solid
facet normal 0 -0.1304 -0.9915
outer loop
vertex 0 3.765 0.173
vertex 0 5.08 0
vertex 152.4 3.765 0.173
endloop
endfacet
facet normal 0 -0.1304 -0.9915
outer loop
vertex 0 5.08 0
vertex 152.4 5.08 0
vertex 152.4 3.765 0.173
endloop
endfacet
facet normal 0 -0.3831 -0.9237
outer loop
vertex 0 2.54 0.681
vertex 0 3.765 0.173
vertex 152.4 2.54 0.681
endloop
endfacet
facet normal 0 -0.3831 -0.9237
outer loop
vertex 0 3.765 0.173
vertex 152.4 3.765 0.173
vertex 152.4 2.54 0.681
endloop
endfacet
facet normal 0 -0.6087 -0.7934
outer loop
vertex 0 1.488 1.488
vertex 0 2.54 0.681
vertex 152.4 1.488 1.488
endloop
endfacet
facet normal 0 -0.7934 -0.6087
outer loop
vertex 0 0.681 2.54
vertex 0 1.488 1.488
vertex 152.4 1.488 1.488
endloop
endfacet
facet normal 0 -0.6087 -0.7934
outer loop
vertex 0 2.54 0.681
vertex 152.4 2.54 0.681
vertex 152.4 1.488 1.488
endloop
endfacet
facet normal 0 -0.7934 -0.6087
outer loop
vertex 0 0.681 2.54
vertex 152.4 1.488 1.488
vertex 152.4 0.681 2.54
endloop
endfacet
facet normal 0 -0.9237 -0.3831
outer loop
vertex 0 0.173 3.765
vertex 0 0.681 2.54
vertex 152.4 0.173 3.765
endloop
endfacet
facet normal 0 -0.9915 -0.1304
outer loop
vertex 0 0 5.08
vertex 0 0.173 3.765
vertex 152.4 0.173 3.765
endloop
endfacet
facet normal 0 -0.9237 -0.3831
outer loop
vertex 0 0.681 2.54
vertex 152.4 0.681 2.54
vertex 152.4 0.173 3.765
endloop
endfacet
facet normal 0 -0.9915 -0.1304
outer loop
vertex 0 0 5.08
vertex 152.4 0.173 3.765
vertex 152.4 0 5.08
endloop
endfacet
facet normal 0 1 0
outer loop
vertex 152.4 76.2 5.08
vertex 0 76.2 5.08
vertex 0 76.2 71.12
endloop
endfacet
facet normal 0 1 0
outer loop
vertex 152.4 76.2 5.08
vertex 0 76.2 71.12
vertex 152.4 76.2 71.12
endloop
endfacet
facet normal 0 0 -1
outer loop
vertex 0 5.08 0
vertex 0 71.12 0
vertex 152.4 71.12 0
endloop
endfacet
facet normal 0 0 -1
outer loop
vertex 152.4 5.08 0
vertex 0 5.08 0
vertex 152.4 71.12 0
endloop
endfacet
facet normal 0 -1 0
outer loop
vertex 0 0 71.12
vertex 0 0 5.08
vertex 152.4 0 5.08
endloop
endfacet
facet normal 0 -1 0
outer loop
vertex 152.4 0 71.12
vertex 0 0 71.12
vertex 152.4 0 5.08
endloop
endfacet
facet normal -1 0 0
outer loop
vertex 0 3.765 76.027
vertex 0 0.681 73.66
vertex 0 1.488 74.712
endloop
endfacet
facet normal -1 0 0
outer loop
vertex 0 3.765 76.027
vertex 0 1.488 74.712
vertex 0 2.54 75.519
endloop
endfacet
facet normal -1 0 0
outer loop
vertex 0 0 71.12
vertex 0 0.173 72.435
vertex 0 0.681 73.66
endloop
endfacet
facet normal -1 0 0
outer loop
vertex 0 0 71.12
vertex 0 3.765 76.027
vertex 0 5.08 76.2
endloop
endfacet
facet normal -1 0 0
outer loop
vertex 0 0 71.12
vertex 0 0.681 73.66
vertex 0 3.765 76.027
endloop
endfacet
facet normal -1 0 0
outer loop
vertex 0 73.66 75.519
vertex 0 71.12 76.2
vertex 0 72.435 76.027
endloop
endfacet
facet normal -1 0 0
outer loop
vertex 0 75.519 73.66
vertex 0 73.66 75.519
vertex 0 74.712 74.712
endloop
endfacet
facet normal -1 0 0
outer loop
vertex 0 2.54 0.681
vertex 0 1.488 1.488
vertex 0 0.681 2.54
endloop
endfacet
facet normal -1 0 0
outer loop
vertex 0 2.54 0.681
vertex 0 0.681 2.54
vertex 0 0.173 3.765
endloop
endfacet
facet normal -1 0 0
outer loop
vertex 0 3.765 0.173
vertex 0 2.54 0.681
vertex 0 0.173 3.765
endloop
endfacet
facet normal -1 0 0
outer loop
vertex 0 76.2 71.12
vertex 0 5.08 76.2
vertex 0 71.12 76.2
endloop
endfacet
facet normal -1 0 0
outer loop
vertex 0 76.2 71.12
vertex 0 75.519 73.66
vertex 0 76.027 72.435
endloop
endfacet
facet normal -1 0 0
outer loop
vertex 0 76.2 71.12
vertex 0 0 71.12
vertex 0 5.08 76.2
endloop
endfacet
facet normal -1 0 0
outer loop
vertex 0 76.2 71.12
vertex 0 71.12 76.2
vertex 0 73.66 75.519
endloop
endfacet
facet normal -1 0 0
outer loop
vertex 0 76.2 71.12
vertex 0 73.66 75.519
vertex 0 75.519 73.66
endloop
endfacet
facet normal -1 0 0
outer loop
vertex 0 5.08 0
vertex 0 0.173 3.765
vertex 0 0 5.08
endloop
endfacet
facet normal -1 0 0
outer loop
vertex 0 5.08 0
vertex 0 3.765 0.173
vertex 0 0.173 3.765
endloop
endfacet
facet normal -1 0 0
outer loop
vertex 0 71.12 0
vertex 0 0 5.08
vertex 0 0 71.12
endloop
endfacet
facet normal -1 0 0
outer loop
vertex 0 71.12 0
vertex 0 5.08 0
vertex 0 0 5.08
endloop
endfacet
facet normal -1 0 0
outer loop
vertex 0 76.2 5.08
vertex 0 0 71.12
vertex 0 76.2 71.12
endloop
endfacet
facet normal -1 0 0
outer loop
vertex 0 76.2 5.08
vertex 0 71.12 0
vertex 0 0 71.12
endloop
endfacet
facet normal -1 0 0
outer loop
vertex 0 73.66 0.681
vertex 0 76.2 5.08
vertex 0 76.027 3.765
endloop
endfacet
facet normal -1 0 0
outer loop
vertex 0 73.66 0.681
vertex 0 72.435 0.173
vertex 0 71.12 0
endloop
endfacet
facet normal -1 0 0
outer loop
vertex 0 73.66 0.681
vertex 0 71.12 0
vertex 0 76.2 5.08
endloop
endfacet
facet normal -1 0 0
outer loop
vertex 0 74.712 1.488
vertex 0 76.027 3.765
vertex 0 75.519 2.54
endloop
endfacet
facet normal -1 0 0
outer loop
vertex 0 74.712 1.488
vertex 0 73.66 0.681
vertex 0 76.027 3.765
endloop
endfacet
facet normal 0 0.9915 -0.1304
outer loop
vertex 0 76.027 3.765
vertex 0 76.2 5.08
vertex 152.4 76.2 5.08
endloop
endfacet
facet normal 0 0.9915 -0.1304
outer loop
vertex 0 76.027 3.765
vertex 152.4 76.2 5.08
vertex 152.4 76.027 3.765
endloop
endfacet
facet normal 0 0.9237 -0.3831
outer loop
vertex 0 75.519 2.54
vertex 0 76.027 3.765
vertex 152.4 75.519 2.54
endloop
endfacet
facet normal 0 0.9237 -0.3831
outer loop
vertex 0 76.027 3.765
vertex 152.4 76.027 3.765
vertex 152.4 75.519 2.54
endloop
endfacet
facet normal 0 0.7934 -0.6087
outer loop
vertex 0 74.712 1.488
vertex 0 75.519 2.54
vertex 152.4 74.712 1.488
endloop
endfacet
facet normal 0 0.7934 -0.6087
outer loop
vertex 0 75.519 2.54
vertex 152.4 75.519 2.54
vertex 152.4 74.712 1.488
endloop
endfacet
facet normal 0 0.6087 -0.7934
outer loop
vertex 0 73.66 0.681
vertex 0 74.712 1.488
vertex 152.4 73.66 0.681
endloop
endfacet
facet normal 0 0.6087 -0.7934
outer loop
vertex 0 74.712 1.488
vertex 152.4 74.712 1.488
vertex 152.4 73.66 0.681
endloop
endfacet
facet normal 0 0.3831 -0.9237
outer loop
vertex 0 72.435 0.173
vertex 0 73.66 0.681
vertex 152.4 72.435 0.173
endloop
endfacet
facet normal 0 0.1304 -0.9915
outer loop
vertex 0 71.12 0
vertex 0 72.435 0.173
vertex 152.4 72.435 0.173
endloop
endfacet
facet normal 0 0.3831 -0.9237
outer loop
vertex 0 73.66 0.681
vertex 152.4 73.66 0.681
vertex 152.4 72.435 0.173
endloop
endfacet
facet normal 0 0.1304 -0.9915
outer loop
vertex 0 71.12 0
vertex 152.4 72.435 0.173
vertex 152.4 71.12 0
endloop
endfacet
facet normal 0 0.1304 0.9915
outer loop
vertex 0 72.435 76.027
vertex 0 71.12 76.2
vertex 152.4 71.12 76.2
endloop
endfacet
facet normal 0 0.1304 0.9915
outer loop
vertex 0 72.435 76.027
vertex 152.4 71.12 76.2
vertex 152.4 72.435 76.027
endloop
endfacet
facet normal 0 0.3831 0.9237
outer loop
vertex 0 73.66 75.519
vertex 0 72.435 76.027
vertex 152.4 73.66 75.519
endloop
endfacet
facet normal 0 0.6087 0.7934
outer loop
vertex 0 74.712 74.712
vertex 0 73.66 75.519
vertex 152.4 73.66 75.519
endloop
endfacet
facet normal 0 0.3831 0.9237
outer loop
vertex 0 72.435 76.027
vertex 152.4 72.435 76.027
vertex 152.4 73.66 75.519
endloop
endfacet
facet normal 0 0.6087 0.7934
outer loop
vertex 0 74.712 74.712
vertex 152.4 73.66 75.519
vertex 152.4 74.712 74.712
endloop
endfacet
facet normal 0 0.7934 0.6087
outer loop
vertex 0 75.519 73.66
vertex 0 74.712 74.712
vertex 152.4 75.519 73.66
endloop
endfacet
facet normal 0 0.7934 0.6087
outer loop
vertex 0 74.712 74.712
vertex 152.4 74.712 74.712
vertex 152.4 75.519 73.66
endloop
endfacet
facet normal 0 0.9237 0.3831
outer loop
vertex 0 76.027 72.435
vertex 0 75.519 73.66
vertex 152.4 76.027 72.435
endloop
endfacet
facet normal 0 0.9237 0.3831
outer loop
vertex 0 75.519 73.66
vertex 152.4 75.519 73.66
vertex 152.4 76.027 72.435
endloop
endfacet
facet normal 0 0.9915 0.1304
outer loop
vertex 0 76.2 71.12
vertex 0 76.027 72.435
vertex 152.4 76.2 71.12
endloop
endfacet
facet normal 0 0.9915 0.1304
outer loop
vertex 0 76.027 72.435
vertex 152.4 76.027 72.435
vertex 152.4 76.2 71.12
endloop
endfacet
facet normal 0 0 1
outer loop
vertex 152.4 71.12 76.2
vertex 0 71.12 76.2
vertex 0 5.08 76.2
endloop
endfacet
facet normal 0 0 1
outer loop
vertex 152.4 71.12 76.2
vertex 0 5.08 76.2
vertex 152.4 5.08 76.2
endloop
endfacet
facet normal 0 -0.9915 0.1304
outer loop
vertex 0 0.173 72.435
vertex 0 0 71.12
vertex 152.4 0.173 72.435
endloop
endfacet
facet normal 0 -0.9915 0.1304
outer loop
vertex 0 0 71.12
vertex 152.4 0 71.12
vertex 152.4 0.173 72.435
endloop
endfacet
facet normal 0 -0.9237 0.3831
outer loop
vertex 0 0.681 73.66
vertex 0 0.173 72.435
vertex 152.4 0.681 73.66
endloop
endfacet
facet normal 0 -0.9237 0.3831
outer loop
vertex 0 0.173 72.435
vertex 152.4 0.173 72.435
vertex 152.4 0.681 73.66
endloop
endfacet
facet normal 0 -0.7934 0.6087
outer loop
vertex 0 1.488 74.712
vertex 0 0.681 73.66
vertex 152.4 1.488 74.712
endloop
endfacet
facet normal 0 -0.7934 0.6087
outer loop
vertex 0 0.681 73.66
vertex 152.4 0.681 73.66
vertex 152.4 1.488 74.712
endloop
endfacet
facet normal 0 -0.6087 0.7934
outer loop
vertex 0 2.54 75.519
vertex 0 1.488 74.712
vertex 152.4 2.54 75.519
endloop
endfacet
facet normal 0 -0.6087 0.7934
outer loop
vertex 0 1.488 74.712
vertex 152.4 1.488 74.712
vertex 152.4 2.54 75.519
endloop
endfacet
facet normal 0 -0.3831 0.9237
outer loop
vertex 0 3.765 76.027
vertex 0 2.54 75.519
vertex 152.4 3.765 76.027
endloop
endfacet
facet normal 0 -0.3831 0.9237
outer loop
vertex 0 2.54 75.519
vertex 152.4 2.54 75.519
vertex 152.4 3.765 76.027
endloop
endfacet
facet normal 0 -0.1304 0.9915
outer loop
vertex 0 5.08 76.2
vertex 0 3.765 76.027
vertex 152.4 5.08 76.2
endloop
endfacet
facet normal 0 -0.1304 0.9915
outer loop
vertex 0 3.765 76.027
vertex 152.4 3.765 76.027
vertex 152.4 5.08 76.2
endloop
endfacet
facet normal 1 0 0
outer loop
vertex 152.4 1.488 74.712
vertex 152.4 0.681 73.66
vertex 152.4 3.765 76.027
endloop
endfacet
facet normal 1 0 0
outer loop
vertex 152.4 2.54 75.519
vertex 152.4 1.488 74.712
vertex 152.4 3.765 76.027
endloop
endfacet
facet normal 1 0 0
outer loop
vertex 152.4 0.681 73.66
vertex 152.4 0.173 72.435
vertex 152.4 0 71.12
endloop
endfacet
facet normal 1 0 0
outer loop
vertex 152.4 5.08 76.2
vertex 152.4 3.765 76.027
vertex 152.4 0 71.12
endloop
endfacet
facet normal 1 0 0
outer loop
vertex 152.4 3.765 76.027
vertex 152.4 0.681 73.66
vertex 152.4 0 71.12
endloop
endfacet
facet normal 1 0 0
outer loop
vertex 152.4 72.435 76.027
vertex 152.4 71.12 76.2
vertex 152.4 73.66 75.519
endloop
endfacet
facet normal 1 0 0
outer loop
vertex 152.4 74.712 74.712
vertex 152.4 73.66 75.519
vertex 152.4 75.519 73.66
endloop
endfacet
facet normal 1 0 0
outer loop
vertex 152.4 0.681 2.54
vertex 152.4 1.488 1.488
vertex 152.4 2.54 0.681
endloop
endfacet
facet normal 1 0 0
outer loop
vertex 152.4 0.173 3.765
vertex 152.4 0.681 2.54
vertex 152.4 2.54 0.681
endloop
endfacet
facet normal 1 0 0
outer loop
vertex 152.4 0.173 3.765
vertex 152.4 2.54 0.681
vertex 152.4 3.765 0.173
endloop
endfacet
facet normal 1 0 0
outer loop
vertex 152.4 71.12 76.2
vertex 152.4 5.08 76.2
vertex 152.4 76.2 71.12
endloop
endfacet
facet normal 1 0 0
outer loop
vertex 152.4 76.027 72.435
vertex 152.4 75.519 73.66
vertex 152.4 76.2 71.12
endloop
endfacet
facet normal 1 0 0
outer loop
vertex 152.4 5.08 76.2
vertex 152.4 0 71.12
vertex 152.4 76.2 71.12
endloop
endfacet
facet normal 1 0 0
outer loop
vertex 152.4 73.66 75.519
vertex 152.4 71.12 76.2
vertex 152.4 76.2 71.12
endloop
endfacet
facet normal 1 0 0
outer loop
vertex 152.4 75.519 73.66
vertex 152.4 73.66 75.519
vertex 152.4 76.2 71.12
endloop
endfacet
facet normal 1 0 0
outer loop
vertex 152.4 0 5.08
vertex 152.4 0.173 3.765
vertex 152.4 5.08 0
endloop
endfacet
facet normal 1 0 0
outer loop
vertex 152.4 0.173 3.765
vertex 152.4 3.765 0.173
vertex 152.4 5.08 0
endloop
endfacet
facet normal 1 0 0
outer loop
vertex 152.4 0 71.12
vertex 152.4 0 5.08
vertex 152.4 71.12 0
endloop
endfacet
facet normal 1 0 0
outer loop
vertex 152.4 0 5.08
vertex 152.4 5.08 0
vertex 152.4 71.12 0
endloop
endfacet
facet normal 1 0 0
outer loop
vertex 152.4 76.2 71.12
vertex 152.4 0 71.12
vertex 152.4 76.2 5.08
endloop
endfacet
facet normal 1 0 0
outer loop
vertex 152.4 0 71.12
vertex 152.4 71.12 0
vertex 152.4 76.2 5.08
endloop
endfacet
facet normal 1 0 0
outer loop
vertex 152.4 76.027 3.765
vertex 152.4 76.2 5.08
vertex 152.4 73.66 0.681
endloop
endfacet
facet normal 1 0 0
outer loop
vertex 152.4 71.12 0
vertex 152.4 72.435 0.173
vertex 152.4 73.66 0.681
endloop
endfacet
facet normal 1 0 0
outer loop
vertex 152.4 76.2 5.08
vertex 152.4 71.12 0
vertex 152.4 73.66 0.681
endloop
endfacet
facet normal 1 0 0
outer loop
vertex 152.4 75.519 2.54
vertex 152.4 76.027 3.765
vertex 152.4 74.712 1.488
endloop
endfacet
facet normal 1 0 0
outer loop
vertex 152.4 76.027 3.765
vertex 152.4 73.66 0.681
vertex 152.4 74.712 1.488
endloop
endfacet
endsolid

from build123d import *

# Parameters (mm, degrees)
BOX_W       = 152.4
BOX_H       = 76.2
BOX_DEPTH   = 76.2
FILLET_R    = 5.08
FILLET001_R = 5.08
FILLET002_R = 5.08
FILLET003_R = 5.08


with BuildPart() as part:
    # Box → Box (join)
    with BuildSketch(Plane.XY):
        with Locations((76.2, 38.1)):
            Rectangle(BOX_W, BOX_H)
    extrude(amount=BOX_DEPTH)

    # Fillet
    fillet_edges = [part.edges().sort_by_distance(p)[0] for p in [
        (76.2, 0, 76.2),
    ]]
    fillet(fillet_edges, radius=FILLET_R)

    # Fillet001
    fillet001_edges = [part.edges().sort_by_distance(p)[0] for p in [
        (76.2, 76.2, 76.2),
    ]]
    fillet(fillet001_edges, radius=FILLET001_R)

    # Fillet002
    fillet002_edges = [part.edges().sort_by_distance(p)[0] for p in [
        (76.2, 76.2, 0),
    ]]
    fillet(fillet002_edges, radius=FILLET002_R)

    # Fillet003
    fillet003_edges = [part.edges().sort_by_distance(p)[0] for p in [
        (76.2, 0, 0),
    ]]
    fillet(fillet003_edges, radius=FILLET003_R)


solid = part.part
